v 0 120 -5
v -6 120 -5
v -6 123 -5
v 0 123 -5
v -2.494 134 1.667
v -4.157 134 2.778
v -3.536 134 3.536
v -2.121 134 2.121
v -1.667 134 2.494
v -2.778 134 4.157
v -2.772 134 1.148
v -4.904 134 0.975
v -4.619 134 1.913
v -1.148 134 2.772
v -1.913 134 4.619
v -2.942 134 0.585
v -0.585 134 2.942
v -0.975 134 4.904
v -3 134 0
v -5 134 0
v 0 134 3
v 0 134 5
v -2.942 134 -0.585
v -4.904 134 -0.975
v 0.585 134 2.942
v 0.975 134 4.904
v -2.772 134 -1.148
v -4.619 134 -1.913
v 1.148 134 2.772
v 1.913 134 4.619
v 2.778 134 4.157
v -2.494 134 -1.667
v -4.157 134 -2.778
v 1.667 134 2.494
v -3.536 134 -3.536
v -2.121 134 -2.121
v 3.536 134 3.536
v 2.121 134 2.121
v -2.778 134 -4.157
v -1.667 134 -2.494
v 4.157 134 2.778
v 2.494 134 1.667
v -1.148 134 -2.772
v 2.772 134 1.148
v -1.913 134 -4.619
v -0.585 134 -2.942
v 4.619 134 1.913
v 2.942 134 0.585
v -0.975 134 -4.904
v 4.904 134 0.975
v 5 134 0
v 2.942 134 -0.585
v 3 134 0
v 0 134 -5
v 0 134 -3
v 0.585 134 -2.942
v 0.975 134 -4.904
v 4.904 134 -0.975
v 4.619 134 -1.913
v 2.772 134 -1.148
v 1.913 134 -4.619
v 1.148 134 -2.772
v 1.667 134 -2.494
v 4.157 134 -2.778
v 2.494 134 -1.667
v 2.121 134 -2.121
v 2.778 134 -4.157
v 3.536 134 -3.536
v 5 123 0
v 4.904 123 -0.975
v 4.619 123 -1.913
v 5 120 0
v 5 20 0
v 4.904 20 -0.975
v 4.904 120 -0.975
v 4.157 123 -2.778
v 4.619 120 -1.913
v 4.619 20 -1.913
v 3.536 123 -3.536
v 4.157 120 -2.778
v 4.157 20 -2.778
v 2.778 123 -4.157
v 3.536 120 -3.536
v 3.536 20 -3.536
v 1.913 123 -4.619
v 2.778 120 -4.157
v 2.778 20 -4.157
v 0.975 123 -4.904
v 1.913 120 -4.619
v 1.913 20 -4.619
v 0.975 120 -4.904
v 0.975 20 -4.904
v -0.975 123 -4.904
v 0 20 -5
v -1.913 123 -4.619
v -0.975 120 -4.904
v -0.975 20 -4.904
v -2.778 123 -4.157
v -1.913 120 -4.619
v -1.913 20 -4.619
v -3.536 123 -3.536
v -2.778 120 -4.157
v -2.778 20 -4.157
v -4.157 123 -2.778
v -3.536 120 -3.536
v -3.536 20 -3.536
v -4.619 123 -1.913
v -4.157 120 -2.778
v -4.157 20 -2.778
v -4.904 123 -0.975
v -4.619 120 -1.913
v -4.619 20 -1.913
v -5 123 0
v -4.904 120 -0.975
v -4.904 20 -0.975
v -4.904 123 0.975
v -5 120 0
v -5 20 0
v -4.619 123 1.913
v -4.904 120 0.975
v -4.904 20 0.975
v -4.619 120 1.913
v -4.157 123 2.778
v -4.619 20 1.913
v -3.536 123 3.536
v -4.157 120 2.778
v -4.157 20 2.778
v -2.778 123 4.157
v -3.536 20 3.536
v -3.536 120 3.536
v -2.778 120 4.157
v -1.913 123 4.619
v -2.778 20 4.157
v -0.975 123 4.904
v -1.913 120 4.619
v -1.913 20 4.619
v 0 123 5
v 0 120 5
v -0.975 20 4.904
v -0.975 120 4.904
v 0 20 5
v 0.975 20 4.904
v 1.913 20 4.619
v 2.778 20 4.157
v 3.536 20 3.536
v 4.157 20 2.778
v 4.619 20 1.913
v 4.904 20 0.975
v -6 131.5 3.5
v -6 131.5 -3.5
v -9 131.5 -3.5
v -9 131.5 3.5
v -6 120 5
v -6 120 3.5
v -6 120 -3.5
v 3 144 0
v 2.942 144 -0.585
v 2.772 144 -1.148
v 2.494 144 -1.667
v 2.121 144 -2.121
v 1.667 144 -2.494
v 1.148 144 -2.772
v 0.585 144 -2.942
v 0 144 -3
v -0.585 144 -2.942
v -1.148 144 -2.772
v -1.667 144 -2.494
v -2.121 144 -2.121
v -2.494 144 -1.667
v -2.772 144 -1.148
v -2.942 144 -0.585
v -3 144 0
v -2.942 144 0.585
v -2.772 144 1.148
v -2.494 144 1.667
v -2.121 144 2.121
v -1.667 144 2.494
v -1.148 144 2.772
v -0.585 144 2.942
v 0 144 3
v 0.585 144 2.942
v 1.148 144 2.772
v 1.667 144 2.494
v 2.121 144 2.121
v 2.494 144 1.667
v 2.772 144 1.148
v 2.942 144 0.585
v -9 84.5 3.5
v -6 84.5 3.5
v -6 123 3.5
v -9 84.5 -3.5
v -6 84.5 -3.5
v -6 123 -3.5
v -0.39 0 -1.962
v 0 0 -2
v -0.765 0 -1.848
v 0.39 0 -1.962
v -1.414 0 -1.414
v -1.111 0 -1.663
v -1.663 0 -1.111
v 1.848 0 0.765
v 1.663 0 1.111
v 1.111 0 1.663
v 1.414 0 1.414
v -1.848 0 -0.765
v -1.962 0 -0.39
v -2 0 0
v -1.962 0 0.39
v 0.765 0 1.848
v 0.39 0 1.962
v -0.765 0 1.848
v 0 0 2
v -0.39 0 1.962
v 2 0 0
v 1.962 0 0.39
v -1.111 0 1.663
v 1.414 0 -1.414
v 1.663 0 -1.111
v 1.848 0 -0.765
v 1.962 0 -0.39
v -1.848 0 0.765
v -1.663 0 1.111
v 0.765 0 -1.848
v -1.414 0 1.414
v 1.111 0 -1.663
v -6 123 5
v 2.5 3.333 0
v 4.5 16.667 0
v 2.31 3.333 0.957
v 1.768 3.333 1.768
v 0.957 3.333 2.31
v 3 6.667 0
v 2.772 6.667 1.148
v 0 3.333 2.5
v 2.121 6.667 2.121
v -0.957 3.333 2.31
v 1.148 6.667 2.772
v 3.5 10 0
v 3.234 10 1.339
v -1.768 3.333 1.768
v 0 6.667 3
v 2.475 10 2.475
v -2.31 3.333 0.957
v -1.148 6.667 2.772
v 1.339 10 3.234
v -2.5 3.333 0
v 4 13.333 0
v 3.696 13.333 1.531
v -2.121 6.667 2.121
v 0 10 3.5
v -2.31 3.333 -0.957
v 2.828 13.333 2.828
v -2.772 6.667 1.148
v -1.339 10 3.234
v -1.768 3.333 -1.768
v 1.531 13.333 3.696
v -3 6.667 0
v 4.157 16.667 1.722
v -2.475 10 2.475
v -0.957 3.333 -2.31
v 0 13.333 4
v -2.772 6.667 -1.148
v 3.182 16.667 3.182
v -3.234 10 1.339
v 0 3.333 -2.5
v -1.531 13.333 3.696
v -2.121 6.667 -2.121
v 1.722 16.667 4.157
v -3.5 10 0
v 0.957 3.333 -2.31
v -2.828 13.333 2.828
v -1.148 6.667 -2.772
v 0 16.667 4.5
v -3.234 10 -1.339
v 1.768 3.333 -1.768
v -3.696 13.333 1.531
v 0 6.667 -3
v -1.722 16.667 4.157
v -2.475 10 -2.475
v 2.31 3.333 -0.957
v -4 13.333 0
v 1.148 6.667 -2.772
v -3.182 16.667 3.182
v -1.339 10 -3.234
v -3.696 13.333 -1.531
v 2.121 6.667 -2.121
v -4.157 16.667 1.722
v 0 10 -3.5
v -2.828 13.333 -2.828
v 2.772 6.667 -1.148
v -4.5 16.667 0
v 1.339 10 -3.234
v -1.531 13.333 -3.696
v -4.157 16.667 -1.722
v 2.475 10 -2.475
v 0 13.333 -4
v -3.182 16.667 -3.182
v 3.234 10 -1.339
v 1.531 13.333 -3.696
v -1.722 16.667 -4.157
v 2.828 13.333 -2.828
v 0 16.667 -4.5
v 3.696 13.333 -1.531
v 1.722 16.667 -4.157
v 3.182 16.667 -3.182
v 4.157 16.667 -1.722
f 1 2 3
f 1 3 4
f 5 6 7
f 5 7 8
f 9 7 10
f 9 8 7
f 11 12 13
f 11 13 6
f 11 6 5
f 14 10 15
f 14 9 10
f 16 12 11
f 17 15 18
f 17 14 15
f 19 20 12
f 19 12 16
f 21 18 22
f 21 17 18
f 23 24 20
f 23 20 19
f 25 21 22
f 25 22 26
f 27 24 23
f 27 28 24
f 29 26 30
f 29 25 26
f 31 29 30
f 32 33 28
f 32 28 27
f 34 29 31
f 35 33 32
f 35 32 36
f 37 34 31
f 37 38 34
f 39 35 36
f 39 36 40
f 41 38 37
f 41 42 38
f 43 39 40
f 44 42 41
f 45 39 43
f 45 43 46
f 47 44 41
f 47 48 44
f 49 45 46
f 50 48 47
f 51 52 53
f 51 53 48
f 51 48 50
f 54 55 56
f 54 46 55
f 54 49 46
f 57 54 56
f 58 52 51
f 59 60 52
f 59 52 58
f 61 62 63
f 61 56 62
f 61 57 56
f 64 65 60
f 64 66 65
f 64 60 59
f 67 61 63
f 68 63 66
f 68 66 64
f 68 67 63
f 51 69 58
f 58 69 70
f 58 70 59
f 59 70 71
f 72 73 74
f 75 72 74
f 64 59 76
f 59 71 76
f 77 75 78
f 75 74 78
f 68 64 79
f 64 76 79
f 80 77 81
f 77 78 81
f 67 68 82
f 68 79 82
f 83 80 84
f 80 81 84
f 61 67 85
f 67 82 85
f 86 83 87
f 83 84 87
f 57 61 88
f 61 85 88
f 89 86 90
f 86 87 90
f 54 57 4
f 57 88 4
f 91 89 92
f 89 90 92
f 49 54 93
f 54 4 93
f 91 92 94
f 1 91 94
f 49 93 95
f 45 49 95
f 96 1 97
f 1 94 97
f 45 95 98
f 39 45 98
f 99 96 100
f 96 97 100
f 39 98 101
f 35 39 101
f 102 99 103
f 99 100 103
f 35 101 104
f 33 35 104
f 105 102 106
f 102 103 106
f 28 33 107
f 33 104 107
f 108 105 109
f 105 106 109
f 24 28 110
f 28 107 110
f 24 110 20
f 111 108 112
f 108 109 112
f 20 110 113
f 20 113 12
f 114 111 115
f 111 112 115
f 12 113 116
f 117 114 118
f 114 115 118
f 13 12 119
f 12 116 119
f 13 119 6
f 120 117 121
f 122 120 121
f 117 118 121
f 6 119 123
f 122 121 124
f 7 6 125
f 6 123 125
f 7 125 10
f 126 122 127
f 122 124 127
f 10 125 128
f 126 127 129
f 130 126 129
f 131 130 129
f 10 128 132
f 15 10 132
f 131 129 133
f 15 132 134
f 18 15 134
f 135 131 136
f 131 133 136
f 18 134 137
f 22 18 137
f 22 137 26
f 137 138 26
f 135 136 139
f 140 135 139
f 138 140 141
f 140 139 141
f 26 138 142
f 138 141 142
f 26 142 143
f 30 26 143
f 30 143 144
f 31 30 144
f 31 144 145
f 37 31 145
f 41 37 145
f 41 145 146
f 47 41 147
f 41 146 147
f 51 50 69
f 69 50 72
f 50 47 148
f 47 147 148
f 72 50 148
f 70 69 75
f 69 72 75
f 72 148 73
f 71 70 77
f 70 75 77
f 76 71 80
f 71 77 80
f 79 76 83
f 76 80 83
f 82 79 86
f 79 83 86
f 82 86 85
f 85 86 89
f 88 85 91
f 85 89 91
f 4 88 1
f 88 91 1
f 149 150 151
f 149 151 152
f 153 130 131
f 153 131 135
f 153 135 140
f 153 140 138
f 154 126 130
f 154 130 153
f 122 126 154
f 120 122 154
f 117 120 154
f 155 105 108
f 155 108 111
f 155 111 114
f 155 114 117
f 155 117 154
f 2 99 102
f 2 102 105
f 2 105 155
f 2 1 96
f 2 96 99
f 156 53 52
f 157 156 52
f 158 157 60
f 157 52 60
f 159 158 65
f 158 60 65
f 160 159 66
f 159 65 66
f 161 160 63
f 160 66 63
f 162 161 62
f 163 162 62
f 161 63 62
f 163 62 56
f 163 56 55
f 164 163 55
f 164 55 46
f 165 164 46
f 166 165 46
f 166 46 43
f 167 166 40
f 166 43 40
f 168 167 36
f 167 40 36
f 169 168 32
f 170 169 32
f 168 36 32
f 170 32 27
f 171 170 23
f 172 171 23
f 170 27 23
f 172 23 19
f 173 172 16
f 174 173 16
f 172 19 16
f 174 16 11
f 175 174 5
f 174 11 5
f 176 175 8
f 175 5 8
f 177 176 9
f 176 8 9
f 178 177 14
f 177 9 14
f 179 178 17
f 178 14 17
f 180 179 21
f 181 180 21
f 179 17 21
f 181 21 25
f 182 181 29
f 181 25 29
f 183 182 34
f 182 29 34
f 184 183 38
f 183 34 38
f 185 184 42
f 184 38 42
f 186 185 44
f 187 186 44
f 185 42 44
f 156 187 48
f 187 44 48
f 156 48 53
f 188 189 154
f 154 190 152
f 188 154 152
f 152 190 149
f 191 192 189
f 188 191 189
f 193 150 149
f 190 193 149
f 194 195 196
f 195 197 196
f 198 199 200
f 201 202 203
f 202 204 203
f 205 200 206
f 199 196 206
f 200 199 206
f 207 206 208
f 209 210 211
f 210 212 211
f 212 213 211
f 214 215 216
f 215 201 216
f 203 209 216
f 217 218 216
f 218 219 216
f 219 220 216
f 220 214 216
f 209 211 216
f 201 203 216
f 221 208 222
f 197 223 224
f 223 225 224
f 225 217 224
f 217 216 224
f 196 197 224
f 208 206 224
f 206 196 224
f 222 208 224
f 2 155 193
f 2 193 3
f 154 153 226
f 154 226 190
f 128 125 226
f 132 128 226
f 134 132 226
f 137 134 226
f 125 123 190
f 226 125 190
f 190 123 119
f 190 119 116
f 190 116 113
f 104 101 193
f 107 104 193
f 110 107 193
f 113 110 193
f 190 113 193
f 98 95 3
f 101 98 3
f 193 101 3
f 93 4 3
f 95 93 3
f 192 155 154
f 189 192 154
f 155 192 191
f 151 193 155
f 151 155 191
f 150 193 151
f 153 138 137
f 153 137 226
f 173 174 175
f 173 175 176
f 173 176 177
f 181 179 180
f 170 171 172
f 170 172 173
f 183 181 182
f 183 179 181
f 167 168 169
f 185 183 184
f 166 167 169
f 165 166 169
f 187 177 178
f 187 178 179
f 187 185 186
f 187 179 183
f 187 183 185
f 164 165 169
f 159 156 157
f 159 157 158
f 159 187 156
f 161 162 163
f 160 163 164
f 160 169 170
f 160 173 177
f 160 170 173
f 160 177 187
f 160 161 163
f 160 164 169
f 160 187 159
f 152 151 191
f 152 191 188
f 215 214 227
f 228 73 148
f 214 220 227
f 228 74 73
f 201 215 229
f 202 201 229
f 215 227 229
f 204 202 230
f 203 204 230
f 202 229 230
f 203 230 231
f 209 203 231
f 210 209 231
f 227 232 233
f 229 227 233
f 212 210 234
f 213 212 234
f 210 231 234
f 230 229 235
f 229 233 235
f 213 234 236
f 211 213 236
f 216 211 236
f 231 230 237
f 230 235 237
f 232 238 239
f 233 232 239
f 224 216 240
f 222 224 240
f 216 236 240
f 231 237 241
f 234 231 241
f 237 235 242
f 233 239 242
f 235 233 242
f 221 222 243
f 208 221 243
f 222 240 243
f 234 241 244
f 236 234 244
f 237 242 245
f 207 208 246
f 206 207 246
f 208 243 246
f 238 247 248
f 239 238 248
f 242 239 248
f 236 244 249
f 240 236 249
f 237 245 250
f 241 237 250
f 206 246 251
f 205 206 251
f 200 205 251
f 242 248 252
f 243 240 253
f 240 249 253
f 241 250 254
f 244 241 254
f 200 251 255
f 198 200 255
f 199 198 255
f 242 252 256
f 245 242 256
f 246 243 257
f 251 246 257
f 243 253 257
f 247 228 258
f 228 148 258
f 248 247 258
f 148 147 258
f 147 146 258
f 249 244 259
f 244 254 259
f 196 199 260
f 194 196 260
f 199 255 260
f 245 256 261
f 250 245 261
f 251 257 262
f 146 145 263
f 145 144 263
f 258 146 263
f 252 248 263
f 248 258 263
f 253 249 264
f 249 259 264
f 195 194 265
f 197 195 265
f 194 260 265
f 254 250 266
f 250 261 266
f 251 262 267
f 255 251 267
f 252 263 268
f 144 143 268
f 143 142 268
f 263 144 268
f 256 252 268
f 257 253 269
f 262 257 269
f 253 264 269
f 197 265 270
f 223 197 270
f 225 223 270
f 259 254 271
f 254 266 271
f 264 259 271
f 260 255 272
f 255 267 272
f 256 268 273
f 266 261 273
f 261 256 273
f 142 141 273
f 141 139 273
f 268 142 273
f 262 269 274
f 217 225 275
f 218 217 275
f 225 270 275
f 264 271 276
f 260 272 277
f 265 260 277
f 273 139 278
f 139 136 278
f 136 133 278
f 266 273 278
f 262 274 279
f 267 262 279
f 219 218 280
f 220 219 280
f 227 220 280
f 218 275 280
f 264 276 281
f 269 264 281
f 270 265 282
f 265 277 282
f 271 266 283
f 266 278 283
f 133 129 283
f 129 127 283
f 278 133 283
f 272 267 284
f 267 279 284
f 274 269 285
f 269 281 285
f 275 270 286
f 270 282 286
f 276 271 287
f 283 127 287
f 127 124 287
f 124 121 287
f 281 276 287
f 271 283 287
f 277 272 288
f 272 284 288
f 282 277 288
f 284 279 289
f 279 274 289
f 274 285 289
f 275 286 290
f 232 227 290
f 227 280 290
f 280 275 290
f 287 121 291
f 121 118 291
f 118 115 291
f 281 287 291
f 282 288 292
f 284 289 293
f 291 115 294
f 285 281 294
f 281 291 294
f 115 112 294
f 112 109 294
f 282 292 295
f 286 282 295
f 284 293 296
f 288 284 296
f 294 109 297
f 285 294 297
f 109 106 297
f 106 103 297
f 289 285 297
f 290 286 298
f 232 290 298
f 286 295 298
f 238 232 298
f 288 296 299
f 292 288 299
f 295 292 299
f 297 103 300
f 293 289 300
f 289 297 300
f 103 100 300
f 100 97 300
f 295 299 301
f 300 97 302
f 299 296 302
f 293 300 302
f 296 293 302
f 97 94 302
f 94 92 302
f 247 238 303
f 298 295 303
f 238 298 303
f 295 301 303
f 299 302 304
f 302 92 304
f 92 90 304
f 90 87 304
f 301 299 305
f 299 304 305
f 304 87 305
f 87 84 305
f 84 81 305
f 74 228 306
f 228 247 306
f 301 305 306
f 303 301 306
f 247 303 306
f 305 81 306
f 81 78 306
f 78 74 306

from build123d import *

# Parameters (mm, degrees)
ESBO_O3_R                = 5
RESSALTO_EXTRUS_O1_DEPTH = 100
RESSALTO_EXTRUS_O2_DEPTH = 3
ESBO_O5_W                = 7
ESBO_O5_H                = 47
RESSALTO_EXTRUS_O3_DEPTH = 3
ESBO_O6_R                = 5
RESSALTO_EXTRUS_O4_DEPTH = 11
ESBO_O7_R                = 3
RESSALTO_EXTRUS_O5_DEPTH = 10


with BuildPart() as part:
    # Esboço2 → Revolução1 (revolve)
    with BuildSketch(Plane.XY):
        Polygon((2, 0), (5, 20), (0, 20), (0, 0), align=None)
    revolve(axis=Axis((0, 22.732303323, 0), (0, -1, 0)))

    # Esboço3 → Ressalto-extrusão1 (add)
    with BuildSketch(Plane(origin=(0, 20, 0), x_dir=(1, 0, 0), z_dir=(0, 1, 0))):
        Circle(ESBO_O3_R)
    extrude(amount=RESSALTO_EXTRUS_O1_DEPTH)

    # Esboço4 → Ressalto-extrusão2 (add)
    with BuildSketch(Plane(origin=(0, 120, 0), x_dir=(1, 0, 0), z_dir=(0, 1, 0))):
        with BuildLine():
            Line((-6, 5), (0, 5))
            ThreePointArc((0, 5), (5, 0), (0, -5))
            Line((0, -5), (-6, -5))
            Line((-6, -5), (-6, 5))
        make_face()
    extrude(amount=RESSALTO_EXTRUS_O2_DEPTH)

    # Esboço5 → Ressalto-extrusão3 (add)
    with BuildSketch(Plane.ZY.offset(6)):
        with Locations((0, 108)):
            Rectangle(ESBO_O5_W, ESBO_O5_H)
    extrude(amount=RESSALTO_EXTRUS_O3_DEPTH)

    # Esboço6 → Ressalto-extrusão4 (add)
    with BuildSketch(Plane(origin=(0, 123, 0), x_dir=(1, 0, 0), z_dir=(0, 1, 0))):
        Circle(ESBO_O6_R)
    extrude(amount=RESSALTO_EXTRUS_O4_DEPTH)

    # Esboço7 → Ressalto-extrusão5 (add)
    with BuildSketch(Plane(origin=(0, 134, 0), x_dir=(1, 0, 0), z_dir=(0, 1, 0))):
        Circle(ESBO_O7_R)
    extrude(amount=RESSALTO_EXTRUS_O5_DEPTH)


solid = part.part
